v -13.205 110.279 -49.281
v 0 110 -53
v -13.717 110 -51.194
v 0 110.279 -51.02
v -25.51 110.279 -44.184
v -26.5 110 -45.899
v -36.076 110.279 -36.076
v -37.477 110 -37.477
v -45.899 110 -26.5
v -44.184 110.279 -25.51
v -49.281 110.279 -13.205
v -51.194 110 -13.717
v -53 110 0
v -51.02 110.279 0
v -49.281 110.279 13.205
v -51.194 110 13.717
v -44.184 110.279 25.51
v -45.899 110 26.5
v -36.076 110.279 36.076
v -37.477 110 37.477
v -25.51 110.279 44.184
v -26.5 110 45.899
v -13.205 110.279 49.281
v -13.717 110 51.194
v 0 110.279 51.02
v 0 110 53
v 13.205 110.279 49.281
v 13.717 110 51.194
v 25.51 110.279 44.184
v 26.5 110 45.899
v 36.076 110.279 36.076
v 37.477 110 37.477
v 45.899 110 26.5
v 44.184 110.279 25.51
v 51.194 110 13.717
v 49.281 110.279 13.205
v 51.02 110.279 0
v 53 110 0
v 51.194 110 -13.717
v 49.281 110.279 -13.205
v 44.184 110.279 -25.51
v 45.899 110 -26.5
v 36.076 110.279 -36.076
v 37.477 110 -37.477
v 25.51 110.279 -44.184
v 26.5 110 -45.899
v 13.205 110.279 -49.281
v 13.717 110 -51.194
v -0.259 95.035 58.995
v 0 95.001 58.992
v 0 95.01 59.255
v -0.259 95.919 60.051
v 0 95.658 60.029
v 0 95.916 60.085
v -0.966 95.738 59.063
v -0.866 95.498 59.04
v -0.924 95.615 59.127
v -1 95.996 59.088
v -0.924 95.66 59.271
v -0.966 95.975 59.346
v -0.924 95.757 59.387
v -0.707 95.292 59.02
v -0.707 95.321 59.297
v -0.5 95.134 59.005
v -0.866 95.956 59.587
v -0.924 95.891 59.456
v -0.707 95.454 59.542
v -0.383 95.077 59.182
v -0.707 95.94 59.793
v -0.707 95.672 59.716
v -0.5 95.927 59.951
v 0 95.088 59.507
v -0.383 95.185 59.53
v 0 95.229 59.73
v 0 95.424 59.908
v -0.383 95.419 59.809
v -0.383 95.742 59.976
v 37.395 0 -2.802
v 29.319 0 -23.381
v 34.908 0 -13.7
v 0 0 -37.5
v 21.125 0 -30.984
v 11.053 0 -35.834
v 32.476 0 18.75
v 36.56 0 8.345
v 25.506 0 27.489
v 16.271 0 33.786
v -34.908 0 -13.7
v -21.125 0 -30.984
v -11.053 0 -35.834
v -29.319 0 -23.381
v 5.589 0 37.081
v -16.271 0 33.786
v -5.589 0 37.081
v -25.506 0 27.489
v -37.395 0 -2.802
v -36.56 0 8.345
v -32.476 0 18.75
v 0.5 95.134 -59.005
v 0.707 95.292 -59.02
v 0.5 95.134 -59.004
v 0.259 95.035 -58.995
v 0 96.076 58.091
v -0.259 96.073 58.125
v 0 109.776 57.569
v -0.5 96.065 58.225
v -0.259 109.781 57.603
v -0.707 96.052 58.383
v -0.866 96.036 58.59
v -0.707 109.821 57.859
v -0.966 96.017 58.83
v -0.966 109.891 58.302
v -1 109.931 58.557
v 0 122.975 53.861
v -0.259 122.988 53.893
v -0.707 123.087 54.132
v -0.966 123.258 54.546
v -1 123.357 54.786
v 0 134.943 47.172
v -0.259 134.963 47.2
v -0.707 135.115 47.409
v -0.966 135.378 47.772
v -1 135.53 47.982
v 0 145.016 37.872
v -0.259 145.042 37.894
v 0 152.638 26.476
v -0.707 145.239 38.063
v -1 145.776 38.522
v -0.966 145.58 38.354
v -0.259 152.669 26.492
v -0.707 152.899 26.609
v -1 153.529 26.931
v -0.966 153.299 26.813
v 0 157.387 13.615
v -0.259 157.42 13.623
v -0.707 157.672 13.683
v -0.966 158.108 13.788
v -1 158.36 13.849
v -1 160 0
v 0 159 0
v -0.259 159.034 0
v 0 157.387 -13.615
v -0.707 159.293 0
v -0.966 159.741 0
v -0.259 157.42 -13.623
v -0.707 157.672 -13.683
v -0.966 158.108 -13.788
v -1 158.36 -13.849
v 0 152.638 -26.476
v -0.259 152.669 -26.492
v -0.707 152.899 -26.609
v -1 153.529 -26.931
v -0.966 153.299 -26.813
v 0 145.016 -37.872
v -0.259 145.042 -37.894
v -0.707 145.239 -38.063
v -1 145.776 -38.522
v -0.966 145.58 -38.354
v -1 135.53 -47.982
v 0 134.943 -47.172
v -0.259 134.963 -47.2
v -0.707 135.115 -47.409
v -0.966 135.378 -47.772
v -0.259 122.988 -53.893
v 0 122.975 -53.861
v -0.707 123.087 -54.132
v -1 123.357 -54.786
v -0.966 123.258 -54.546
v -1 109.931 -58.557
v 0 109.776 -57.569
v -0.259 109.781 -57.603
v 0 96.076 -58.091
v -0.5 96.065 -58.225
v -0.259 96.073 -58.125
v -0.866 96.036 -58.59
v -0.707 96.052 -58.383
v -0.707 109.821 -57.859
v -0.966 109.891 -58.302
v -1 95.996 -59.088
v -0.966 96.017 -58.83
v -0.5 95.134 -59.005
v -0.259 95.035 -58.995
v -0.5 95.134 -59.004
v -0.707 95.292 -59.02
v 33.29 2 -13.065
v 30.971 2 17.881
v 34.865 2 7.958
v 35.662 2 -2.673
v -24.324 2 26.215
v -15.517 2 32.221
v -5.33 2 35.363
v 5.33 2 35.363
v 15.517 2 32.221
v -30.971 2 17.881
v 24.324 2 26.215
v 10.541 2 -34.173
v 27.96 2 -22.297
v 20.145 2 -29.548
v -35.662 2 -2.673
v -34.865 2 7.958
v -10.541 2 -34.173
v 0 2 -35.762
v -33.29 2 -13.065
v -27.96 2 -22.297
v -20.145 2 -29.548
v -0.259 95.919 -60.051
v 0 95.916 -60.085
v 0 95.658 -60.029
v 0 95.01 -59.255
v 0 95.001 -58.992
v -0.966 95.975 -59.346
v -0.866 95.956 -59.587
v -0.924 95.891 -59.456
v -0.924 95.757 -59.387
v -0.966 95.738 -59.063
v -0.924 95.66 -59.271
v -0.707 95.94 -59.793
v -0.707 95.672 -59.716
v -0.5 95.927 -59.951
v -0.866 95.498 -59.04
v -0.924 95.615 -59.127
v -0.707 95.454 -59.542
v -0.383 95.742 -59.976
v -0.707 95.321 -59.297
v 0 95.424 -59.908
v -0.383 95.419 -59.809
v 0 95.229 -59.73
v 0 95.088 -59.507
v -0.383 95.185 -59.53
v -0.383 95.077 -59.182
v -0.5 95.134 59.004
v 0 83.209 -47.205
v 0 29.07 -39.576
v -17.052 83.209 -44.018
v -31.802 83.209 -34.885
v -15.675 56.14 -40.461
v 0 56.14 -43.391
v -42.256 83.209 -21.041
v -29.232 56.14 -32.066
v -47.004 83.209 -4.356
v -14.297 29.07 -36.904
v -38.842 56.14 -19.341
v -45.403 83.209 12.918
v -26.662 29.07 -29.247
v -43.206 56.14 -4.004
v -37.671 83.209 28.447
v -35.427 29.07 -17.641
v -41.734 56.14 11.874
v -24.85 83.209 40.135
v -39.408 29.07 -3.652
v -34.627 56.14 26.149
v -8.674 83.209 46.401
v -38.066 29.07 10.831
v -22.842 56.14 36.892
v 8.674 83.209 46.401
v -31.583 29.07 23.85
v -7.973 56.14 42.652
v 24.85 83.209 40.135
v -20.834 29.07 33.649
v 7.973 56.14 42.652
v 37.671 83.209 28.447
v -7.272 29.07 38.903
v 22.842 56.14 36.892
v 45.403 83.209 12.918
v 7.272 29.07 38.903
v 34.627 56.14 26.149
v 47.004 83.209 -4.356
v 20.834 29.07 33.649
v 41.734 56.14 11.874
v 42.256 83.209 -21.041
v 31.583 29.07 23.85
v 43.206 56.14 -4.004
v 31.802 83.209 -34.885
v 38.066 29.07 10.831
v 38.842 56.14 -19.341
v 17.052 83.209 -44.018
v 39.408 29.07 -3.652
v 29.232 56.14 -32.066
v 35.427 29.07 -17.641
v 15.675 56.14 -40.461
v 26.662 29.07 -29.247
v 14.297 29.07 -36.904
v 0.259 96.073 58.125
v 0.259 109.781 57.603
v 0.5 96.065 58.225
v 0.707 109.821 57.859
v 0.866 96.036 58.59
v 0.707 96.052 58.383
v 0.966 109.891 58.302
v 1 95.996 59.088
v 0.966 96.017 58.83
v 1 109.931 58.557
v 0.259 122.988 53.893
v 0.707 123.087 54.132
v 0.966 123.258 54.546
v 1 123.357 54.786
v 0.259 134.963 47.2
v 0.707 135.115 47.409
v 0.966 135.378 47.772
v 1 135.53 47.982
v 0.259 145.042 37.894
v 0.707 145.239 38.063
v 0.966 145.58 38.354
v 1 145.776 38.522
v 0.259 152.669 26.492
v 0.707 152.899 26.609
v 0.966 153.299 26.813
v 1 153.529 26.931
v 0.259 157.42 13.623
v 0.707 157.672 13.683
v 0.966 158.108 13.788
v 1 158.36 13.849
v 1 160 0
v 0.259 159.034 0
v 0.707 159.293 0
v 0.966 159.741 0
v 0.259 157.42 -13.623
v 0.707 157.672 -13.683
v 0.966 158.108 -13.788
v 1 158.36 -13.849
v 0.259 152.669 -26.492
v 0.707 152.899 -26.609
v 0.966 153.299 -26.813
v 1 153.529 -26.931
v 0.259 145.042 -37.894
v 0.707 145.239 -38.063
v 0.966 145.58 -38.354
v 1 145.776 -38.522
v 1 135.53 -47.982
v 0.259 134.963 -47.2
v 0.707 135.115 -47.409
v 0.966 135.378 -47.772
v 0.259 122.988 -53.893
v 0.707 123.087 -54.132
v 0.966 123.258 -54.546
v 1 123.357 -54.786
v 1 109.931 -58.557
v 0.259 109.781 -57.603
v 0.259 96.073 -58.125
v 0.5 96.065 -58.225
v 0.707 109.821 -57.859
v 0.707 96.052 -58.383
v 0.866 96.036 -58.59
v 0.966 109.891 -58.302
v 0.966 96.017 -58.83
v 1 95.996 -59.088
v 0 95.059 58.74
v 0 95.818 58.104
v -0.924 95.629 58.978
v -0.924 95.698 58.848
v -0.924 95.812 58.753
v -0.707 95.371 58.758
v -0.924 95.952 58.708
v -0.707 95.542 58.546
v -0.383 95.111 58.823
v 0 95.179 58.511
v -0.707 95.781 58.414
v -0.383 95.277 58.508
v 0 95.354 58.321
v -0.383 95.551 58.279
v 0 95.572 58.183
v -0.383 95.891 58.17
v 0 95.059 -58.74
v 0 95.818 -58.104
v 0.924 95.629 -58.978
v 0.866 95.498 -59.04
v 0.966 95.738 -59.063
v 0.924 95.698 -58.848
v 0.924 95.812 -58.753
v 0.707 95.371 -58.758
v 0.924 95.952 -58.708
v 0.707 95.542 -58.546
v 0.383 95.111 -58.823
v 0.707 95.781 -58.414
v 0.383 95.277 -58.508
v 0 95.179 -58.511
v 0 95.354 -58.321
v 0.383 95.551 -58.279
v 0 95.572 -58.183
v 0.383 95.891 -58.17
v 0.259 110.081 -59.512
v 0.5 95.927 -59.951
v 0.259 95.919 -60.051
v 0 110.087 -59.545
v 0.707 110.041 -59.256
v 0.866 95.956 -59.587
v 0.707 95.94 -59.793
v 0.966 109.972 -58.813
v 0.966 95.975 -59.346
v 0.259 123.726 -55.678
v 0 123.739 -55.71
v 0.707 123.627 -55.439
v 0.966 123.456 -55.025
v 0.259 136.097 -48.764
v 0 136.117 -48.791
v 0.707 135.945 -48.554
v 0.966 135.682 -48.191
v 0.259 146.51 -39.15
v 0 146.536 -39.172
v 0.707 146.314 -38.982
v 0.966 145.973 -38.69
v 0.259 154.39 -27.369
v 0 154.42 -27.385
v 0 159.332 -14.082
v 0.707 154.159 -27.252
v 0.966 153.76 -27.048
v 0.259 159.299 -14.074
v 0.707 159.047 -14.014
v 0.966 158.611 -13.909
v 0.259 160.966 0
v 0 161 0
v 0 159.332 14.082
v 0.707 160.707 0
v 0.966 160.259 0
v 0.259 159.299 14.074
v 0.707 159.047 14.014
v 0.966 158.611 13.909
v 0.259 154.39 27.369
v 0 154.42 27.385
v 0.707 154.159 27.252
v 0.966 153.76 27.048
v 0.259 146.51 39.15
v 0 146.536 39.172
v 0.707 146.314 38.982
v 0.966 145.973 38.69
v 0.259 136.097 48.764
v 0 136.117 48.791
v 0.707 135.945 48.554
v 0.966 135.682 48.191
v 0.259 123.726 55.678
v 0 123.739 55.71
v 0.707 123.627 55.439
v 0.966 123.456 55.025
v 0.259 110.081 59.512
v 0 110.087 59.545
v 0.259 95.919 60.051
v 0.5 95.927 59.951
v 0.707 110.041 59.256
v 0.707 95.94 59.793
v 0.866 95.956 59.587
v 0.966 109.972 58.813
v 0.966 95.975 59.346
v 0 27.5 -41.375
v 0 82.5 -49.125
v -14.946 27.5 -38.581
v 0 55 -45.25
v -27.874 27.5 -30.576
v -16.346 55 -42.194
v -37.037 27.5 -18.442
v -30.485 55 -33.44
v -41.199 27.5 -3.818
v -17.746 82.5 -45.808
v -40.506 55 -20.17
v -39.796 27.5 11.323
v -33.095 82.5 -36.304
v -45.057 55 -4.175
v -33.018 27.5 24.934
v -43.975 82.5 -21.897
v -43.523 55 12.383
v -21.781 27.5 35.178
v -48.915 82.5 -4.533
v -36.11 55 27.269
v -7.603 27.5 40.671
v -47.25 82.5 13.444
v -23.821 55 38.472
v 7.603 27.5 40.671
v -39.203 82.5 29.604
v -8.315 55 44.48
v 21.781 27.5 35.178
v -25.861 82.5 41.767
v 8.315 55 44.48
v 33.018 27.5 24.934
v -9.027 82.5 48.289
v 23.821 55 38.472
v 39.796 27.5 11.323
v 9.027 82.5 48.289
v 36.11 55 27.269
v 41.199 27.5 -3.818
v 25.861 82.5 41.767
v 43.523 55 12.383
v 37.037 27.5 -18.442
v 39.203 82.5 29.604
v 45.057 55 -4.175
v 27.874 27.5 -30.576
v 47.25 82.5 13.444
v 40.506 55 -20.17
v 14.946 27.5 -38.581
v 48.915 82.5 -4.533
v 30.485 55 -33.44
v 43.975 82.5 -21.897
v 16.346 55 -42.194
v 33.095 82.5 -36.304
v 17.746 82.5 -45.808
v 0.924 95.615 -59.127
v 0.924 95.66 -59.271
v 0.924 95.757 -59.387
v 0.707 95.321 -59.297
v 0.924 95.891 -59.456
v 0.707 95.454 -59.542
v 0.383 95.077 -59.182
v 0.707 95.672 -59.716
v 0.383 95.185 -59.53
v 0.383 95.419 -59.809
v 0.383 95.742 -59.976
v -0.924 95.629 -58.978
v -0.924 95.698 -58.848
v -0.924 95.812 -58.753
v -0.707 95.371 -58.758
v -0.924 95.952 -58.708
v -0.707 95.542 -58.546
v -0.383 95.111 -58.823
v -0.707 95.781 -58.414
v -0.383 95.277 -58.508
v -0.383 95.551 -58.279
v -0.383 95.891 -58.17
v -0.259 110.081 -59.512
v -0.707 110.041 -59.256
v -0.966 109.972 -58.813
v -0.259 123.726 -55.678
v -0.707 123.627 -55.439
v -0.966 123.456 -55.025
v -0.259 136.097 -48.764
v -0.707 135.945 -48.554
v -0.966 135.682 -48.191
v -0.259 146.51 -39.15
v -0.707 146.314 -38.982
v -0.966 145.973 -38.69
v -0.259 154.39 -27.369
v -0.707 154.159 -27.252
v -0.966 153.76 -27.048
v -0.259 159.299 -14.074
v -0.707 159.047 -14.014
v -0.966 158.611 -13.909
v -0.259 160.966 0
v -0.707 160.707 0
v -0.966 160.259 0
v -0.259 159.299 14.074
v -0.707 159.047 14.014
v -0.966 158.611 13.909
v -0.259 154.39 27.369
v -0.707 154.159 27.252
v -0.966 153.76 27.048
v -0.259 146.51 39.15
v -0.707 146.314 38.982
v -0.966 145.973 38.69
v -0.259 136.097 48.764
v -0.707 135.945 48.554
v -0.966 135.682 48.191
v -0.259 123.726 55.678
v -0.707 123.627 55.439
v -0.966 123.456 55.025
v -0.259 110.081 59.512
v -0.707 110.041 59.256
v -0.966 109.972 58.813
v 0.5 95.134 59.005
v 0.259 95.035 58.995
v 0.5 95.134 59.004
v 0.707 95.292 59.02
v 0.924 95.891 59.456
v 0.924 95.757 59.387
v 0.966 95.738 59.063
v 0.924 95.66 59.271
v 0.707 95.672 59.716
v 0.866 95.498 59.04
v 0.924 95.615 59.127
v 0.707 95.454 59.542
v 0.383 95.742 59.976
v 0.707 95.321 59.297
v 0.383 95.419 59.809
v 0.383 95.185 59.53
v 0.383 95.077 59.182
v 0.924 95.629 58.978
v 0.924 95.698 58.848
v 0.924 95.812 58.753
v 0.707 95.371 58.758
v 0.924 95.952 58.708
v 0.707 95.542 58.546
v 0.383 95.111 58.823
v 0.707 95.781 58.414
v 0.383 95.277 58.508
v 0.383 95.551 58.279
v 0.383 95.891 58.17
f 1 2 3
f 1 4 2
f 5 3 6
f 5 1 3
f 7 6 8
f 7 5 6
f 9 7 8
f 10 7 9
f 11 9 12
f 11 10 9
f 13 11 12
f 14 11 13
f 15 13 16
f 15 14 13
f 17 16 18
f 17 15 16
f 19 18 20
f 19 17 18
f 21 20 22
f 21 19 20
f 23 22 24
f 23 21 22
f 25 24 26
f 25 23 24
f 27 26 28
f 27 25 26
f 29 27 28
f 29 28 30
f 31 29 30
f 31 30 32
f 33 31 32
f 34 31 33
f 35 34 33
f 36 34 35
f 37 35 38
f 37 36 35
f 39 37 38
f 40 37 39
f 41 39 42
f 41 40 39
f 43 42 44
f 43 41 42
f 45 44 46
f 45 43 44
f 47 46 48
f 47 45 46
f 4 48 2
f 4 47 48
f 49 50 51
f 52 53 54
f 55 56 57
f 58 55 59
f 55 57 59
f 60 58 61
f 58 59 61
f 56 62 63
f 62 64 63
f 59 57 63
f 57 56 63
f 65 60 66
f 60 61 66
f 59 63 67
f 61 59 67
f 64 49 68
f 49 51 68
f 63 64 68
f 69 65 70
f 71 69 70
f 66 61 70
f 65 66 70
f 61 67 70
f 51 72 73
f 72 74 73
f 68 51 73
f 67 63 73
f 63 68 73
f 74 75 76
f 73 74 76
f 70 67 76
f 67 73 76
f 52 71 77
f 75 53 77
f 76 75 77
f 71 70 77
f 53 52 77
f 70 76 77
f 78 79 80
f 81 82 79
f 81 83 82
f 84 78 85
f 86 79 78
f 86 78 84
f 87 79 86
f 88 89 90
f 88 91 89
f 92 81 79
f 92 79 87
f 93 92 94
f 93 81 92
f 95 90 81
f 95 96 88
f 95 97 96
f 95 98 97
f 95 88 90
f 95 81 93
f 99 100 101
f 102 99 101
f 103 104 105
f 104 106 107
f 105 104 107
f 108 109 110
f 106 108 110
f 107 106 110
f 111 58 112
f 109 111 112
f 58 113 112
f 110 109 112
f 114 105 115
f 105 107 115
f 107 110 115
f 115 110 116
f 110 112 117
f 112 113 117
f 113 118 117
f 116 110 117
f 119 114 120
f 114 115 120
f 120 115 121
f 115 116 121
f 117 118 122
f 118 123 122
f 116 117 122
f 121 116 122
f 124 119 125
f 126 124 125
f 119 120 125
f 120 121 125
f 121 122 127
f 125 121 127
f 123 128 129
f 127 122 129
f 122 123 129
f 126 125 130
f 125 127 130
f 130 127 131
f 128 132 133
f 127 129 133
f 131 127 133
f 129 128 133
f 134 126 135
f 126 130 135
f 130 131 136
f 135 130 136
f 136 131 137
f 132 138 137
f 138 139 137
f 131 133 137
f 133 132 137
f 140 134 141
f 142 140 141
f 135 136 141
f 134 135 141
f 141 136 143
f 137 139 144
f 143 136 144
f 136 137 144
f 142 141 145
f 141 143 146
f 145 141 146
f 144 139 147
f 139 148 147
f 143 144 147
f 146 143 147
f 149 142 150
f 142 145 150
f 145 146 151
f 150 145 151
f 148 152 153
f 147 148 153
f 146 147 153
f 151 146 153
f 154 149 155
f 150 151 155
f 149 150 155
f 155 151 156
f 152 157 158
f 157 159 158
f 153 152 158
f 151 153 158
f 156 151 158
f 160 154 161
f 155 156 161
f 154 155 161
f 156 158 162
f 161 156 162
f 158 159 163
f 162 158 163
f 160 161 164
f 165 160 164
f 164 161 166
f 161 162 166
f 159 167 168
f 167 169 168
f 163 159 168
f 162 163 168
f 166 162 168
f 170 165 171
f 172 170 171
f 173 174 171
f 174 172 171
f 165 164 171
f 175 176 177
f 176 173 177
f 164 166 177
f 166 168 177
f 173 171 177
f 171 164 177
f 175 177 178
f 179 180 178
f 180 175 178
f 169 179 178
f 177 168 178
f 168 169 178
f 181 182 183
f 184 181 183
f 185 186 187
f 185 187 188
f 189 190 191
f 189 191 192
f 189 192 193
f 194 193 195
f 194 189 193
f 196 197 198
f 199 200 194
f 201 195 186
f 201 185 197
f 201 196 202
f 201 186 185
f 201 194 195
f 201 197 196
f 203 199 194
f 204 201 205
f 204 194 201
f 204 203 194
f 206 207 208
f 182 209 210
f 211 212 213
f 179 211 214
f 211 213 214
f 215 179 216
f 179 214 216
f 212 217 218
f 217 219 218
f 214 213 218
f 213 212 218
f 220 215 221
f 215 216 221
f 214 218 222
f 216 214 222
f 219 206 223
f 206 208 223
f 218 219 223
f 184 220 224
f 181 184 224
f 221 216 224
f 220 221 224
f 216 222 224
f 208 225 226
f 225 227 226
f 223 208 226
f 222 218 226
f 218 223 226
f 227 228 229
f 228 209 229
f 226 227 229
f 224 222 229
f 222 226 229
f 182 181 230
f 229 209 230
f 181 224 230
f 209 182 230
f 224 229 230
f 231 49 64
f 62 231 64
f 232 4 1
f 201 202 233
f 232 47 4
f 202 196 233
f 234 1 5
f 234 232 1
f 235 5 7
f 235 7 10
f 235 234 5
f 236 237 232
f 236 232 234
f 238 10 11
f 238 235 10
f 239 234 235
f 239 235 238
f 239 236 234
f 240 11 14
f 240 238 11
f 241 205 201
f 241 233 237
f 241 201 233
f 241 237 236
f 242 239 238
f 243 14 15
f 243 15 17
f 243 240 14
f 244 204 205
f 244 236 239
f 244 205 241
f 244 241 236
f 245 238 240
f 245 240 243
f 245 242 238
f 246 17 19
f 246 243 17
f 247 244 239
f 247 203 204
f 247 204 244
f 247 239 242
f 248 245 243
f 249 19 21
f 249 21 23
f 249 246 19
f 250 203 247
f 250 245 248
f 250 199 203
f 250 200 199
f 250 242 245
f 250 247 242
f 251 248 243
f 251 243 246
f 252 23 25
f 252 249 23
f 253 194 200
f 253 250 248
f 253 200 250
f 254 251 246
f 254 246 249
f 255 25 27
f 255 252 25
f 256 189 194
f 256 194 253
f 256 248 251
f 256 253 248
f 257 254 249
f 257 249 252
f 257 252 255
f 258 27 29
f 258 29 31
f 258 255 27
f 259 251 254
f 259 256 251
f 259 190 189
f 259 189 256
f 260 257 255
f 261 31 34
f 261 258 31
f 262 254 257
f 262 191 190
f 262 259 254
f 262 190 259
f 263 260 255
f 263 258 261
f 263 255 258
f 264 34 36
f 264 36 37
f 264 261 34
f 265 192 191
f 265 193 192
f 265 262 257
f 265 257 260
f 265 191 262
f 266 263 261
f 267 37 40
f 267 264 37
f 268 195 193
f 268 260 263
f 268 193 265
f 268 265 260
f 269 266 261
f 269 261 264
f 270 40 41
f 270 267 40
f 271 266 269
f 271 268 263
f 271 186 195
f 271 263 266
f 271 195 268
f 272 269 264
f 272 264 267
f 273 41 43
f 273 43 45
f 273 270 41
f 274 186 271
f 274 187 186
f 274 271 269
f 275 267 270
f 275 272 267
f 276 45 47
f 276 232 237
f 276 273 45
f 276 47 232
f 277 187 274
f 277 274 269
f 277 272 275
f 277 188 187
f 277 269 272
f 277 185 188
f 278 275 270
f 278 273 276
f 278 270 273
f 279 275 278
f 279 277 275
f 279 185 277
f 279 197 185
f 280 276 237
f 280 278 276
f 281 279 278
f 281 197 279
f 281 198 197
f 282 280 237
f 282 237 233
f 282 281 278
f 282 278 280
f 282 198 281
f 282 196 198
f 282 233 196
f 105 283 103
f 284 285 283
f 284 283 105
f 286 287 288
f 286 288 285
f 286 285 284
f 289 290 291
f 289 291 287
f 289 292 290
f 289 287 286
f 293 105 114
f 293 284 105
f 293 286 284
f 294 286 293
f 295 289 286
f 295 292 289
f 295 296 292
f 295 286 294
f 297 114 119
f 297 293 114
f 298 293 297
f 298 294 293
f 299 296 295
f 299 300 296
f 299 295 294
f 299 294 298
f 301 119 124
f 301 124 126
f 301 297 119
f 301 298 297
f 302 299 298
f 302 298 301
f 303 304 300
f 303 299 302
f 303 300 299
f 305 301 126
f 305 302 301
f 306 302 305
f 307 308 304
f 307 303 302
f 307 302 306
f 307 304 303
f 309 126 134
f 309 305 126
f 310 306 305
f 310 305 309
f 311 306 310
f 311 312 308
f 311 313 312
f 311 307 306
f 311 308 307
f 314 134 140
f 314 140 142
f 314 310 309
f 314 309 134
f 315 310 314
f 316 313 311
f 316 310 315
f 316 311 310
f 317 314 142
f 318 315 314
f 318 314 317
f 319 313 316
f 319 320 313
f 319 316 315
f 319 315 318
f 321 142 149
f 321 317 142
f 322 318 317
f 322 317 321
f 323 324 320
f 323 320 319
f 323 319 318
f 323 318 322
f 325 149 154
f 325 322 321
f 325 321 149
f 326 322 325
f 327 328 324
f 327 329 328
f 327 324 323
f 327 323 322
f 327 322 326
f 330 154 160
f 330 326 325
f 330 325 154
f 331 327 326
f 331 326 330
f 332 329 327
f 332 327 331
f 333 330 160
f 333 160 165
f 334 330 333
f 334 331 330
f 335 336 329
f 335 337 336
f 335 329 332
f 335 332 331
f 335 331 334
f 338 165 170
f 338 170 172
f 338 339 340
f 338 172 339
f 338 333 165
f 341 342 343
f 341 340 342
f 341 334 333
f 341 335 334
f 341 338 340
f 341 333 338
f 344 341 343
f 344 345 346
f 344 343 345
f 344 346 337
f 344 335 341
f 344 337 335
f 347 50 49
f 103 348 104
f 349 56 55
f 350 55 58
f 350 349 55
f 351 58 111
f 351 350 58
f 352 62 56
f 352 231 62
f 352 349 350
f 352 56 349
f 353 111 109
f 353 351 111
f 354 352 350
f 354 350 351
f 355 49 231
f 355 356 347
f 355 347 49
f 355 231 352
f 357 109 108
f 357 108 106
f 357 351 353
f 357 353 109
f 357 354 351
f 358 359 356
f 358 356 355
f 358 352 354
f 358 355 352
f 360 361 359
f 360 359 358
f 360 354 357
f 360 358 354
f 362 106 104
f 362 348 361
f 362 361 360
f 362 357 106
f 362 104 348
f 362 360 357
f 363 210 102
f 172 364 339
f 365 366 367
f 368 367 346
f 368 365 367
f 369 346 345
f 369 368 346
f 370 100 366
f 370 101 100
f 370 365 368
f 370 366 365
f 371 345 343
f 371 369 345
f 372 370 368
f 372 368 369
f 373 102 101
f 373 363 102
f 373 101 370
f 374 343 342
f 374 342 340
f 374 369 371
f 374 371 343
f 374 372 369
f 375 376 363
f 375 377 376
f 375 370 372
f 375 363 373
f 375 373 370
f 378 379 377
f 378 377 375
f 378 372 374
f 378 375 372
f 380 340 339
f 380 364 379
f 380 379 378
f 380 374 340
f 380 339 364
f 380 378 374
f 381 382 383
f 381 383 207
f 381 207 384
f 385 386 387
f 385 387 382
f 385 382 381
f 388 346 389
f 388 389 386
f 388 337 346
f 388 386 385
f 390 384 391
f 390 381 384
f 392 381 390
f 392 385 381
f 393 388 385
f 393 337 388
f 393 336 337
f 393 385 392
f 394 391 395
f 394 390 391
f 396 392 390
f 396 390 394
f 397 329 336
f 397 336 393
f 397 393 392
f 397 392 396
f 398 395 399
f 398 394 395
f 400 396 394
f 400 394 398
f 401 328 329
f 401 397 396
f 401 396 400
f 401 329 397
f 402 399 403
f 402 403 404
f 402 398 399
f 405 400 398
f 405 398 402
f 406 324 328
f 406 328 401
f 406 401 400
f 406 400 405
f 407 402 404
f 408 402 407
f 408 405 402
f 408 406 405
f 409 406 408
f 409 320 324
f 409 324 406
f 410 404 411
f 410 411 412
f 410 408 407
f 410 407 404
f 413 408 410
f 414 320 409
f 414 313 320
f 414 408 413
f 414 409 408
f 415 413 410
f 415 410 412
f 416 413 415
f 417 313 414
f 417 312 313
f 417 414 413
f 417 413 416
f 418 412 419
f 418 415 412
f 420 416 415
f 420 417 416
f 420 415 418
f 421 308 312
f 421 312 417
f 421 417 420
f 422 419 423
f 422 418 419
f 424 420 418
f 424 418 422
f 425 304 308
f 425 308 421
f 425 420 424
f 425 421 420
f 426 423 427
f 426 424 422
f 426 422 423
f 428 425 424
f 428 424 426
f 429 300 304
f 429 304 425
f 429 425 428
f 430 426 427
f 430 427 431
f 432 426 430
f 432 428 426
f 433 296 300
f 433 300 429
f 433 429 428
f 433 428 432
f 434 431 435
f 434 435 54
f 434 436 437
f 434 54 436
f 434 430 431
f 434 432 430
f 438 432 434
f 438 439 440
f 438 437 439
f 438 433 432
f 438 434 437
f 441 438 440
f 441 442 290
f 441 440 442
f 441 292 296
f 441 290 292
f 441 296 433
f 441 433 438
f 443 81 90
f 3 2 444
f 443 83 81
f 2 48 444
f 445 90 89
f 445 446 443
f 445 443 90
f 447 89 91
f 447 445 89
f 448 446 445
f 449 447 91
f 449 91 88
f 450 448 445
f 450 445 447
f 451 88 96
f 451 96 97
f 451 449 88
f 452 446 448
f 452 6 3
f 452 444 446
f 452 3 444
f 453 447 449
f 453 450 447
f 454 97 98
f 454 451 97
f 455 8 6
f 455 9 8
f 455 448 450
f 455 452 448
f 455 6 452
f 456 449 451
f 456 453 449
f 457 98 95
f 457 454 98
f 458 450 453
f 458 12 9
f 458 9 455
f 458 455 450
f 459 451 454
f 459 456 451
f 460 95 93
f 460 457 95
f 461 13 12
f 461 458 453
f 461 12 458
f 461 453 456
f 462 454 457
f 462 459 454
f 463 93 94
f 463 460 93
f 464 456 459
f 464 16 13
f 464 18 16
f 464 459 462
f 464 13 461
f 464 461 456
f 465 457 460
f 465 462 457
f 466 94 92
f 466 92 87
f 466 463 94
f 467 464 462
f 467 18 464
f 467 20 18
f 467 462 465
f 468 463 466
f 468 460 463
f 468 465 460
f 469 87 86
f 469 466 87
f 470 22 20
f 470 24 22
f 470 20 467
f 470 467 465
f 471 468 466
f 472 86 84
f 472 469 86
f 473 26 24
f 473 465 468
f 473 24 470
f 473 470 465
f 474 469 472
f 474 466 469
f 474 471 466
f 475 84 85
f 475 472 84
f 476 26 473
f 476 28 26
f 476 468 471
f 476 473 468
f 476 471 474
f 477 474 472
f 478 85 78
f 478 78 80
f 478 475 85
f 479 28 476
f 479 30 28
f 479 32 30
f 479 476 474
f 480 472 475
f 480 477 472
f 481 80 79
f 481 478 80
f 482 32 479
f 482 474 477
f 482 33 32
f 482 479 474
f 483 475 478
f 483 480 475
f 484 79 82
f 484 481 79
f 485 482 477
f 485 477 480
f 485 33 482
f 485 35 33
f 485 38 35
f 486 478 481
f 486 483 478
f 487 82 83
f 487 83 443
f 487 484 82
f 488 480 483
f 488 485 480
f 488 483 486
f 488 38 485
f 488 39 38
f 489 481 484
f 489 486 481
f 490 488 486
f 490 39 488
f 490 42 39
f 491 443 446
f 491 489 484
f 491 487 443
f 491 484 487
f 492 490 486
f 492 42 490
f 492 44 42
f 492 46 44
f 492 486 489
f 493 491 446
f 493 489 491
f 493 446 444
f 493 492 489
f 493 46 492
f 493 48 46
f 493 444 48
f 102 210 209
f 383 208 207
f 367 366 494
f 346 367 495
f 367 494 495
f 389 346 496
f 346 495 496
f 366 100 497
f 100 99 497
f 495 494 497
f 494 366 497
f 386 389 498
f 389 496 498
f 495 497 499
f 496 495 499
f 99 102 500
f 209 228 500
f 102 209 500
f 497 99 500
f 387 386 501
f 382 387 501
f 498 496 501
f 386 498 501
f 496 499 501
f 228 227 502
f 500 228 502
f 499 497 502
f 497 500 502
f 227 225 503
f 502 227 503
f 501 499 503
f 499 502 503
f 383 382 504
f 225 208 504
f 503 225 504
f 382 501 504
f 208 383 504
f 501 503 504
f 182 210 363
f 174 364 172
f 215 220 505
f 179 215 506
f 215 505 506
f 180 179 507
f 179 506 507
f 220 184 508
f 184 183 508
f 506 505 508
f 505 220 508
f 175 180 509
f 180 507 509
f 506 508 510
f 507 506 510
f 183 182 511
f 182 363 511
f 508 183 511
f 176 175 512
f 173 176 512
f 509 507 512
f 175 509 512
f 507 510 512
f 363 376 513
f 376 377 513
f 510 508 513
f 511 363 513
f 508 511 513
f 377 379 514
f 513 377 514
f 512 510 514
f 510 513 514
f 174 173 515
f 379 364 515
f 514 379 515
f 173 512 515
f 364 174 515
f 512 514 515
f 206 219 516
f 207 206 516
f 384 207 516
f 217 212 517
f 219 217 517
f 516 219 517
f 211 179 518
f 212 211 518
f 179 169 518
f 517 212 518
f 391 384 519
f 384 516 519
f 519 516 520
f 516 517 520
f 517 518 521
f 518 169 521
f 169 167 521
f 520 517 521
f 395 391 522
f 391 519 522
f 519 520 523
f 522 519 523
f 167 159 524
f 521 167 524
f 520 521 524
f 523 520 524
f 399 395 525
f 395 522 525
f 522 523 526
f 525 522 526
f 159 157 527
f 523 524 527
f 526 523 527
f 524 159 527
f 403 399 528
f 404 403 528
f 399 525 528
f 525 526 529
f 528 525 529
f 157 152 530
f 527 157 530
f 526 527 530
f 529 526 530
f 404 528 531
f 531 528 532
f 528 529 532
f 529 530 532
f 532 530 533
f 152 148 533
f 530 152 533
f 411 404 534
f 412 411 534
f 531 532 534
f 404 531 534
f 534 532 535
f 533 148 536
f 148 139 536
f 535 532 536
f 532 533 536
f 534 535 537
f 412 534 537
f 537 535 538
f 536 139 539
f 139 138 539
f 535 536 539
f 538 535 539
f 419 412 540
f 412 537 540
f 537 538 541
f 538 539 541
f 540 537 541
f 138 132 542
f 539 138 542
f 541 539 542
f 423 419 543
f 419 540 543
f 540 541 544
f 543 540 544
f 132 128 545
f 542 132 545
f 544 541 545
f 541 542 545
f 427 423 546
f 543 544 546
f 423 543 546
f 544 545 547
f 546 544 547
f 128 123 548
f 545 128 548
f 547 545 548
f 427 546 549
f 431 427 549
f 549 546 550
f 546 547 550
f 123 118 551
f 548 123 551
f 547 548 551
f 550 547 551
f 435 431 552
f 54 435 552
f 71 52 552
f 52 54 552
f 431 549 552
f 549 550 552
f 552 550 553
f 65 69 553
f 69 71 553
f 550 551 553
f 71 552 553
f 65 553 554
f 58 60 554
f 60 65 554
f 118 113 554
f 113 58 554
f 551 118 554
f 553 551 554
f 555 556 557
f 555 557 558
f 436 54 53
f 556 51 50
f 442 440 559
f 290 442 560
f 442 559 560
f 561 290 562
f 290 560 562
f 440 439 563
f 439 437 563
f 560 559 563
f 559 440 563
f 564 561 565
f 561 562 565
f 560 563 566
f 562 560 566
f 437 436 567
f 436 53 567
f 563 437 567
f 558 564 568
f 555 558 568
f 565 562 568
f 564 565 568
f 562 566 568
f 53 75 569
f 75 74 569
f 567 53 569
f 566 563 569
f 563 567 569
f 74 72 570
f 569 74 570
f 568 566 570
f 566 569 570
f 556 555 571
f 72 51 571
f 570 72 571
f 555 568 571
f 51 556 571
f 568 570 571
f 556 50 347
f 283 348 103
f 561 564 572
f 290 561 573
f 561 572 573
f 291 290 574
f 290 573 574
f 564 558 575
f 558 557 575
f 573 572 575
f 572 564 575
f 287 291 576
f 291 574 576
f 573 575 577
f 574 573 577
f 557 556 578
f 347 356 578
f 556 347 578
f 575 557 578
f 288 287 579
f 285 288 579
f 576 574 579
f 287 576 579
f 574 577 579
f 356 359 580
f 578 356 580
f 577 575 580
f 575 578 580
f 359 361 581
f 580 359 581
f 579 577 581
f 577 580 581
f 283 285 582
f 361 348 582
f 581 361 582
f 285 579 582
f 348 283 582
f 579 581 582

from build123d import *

# Parameters (mm, degrees)
EXTRUDE_THIN1_DEPTH = 1
FILLET1_R           = 1


with BuildPart() as part:
    # Sketch1 → Revolve1 (revolve)
    with BuildSketch(Plane.XY, mode=Mode.PRIVATE) as revolve1_sk:
        Polygon((0, 0), (37.5, 0), (53, 110), (51.019564504, 110.279061365), (35.762060402, 2), (0, 2), align=None)
    revolve(revolve1_sk.sketch.rotate(Axis((0, 0, 0), (0, 1, 0)), 90), axis=Axis((0, 0, 0), (0, 1, 0)))


with BuildPart() as body_2:
    # Sketch2 → Extrude-Thin1 (new, symmetric)
    with BuildSketch(Plane(origin=(0, 0, 0), x_dir=(0, 0, -1), z_dir=(1, 0, 0))):
        with BuildLine():
            ThreePointArc((-58.004671684, 95.096548144), (0, 159), (58.004671684, 95.096548144))
            Line((58.004671684, 95.096548144), (59.995328316, 94.903451856))
            ThreePointArc((59.995328316, 94.903451856), (0, 161), (-59.995328316, 94.903451856))
            Line((-59.995328316, 94.903451856), (-58.004671684, 95.096548144))
        make_face()
    extrude(amount=EXTRUDE_THIN1_DEPTH, both=True)

    # Fillet1
    fillet1_edges = [body_2.edges().sort_by_distance(p)[0] for p in [
        (1, 161, 0),
        (1, 95, 59),
        (-1, 95, 59),
        (1, 159, 0),
        (-1, 161, 0),
        (-1, 95, -59),
        (-1, 159, 0),
        (0, 95.096548144, 58.004671684),
        (0, 94.903451856, 59.995328316),
        (0, 94.903451856, -59.995328316),
        (0, 95.096548144, -58.004671684),
        (1, 95, -59),
    ]]
    fillet(fillet1_edges, radius=FILLET1_R - 0.0001)  # a hair under: the kernel refuses the full size


solid = Compound([part.part, body_2.part])
